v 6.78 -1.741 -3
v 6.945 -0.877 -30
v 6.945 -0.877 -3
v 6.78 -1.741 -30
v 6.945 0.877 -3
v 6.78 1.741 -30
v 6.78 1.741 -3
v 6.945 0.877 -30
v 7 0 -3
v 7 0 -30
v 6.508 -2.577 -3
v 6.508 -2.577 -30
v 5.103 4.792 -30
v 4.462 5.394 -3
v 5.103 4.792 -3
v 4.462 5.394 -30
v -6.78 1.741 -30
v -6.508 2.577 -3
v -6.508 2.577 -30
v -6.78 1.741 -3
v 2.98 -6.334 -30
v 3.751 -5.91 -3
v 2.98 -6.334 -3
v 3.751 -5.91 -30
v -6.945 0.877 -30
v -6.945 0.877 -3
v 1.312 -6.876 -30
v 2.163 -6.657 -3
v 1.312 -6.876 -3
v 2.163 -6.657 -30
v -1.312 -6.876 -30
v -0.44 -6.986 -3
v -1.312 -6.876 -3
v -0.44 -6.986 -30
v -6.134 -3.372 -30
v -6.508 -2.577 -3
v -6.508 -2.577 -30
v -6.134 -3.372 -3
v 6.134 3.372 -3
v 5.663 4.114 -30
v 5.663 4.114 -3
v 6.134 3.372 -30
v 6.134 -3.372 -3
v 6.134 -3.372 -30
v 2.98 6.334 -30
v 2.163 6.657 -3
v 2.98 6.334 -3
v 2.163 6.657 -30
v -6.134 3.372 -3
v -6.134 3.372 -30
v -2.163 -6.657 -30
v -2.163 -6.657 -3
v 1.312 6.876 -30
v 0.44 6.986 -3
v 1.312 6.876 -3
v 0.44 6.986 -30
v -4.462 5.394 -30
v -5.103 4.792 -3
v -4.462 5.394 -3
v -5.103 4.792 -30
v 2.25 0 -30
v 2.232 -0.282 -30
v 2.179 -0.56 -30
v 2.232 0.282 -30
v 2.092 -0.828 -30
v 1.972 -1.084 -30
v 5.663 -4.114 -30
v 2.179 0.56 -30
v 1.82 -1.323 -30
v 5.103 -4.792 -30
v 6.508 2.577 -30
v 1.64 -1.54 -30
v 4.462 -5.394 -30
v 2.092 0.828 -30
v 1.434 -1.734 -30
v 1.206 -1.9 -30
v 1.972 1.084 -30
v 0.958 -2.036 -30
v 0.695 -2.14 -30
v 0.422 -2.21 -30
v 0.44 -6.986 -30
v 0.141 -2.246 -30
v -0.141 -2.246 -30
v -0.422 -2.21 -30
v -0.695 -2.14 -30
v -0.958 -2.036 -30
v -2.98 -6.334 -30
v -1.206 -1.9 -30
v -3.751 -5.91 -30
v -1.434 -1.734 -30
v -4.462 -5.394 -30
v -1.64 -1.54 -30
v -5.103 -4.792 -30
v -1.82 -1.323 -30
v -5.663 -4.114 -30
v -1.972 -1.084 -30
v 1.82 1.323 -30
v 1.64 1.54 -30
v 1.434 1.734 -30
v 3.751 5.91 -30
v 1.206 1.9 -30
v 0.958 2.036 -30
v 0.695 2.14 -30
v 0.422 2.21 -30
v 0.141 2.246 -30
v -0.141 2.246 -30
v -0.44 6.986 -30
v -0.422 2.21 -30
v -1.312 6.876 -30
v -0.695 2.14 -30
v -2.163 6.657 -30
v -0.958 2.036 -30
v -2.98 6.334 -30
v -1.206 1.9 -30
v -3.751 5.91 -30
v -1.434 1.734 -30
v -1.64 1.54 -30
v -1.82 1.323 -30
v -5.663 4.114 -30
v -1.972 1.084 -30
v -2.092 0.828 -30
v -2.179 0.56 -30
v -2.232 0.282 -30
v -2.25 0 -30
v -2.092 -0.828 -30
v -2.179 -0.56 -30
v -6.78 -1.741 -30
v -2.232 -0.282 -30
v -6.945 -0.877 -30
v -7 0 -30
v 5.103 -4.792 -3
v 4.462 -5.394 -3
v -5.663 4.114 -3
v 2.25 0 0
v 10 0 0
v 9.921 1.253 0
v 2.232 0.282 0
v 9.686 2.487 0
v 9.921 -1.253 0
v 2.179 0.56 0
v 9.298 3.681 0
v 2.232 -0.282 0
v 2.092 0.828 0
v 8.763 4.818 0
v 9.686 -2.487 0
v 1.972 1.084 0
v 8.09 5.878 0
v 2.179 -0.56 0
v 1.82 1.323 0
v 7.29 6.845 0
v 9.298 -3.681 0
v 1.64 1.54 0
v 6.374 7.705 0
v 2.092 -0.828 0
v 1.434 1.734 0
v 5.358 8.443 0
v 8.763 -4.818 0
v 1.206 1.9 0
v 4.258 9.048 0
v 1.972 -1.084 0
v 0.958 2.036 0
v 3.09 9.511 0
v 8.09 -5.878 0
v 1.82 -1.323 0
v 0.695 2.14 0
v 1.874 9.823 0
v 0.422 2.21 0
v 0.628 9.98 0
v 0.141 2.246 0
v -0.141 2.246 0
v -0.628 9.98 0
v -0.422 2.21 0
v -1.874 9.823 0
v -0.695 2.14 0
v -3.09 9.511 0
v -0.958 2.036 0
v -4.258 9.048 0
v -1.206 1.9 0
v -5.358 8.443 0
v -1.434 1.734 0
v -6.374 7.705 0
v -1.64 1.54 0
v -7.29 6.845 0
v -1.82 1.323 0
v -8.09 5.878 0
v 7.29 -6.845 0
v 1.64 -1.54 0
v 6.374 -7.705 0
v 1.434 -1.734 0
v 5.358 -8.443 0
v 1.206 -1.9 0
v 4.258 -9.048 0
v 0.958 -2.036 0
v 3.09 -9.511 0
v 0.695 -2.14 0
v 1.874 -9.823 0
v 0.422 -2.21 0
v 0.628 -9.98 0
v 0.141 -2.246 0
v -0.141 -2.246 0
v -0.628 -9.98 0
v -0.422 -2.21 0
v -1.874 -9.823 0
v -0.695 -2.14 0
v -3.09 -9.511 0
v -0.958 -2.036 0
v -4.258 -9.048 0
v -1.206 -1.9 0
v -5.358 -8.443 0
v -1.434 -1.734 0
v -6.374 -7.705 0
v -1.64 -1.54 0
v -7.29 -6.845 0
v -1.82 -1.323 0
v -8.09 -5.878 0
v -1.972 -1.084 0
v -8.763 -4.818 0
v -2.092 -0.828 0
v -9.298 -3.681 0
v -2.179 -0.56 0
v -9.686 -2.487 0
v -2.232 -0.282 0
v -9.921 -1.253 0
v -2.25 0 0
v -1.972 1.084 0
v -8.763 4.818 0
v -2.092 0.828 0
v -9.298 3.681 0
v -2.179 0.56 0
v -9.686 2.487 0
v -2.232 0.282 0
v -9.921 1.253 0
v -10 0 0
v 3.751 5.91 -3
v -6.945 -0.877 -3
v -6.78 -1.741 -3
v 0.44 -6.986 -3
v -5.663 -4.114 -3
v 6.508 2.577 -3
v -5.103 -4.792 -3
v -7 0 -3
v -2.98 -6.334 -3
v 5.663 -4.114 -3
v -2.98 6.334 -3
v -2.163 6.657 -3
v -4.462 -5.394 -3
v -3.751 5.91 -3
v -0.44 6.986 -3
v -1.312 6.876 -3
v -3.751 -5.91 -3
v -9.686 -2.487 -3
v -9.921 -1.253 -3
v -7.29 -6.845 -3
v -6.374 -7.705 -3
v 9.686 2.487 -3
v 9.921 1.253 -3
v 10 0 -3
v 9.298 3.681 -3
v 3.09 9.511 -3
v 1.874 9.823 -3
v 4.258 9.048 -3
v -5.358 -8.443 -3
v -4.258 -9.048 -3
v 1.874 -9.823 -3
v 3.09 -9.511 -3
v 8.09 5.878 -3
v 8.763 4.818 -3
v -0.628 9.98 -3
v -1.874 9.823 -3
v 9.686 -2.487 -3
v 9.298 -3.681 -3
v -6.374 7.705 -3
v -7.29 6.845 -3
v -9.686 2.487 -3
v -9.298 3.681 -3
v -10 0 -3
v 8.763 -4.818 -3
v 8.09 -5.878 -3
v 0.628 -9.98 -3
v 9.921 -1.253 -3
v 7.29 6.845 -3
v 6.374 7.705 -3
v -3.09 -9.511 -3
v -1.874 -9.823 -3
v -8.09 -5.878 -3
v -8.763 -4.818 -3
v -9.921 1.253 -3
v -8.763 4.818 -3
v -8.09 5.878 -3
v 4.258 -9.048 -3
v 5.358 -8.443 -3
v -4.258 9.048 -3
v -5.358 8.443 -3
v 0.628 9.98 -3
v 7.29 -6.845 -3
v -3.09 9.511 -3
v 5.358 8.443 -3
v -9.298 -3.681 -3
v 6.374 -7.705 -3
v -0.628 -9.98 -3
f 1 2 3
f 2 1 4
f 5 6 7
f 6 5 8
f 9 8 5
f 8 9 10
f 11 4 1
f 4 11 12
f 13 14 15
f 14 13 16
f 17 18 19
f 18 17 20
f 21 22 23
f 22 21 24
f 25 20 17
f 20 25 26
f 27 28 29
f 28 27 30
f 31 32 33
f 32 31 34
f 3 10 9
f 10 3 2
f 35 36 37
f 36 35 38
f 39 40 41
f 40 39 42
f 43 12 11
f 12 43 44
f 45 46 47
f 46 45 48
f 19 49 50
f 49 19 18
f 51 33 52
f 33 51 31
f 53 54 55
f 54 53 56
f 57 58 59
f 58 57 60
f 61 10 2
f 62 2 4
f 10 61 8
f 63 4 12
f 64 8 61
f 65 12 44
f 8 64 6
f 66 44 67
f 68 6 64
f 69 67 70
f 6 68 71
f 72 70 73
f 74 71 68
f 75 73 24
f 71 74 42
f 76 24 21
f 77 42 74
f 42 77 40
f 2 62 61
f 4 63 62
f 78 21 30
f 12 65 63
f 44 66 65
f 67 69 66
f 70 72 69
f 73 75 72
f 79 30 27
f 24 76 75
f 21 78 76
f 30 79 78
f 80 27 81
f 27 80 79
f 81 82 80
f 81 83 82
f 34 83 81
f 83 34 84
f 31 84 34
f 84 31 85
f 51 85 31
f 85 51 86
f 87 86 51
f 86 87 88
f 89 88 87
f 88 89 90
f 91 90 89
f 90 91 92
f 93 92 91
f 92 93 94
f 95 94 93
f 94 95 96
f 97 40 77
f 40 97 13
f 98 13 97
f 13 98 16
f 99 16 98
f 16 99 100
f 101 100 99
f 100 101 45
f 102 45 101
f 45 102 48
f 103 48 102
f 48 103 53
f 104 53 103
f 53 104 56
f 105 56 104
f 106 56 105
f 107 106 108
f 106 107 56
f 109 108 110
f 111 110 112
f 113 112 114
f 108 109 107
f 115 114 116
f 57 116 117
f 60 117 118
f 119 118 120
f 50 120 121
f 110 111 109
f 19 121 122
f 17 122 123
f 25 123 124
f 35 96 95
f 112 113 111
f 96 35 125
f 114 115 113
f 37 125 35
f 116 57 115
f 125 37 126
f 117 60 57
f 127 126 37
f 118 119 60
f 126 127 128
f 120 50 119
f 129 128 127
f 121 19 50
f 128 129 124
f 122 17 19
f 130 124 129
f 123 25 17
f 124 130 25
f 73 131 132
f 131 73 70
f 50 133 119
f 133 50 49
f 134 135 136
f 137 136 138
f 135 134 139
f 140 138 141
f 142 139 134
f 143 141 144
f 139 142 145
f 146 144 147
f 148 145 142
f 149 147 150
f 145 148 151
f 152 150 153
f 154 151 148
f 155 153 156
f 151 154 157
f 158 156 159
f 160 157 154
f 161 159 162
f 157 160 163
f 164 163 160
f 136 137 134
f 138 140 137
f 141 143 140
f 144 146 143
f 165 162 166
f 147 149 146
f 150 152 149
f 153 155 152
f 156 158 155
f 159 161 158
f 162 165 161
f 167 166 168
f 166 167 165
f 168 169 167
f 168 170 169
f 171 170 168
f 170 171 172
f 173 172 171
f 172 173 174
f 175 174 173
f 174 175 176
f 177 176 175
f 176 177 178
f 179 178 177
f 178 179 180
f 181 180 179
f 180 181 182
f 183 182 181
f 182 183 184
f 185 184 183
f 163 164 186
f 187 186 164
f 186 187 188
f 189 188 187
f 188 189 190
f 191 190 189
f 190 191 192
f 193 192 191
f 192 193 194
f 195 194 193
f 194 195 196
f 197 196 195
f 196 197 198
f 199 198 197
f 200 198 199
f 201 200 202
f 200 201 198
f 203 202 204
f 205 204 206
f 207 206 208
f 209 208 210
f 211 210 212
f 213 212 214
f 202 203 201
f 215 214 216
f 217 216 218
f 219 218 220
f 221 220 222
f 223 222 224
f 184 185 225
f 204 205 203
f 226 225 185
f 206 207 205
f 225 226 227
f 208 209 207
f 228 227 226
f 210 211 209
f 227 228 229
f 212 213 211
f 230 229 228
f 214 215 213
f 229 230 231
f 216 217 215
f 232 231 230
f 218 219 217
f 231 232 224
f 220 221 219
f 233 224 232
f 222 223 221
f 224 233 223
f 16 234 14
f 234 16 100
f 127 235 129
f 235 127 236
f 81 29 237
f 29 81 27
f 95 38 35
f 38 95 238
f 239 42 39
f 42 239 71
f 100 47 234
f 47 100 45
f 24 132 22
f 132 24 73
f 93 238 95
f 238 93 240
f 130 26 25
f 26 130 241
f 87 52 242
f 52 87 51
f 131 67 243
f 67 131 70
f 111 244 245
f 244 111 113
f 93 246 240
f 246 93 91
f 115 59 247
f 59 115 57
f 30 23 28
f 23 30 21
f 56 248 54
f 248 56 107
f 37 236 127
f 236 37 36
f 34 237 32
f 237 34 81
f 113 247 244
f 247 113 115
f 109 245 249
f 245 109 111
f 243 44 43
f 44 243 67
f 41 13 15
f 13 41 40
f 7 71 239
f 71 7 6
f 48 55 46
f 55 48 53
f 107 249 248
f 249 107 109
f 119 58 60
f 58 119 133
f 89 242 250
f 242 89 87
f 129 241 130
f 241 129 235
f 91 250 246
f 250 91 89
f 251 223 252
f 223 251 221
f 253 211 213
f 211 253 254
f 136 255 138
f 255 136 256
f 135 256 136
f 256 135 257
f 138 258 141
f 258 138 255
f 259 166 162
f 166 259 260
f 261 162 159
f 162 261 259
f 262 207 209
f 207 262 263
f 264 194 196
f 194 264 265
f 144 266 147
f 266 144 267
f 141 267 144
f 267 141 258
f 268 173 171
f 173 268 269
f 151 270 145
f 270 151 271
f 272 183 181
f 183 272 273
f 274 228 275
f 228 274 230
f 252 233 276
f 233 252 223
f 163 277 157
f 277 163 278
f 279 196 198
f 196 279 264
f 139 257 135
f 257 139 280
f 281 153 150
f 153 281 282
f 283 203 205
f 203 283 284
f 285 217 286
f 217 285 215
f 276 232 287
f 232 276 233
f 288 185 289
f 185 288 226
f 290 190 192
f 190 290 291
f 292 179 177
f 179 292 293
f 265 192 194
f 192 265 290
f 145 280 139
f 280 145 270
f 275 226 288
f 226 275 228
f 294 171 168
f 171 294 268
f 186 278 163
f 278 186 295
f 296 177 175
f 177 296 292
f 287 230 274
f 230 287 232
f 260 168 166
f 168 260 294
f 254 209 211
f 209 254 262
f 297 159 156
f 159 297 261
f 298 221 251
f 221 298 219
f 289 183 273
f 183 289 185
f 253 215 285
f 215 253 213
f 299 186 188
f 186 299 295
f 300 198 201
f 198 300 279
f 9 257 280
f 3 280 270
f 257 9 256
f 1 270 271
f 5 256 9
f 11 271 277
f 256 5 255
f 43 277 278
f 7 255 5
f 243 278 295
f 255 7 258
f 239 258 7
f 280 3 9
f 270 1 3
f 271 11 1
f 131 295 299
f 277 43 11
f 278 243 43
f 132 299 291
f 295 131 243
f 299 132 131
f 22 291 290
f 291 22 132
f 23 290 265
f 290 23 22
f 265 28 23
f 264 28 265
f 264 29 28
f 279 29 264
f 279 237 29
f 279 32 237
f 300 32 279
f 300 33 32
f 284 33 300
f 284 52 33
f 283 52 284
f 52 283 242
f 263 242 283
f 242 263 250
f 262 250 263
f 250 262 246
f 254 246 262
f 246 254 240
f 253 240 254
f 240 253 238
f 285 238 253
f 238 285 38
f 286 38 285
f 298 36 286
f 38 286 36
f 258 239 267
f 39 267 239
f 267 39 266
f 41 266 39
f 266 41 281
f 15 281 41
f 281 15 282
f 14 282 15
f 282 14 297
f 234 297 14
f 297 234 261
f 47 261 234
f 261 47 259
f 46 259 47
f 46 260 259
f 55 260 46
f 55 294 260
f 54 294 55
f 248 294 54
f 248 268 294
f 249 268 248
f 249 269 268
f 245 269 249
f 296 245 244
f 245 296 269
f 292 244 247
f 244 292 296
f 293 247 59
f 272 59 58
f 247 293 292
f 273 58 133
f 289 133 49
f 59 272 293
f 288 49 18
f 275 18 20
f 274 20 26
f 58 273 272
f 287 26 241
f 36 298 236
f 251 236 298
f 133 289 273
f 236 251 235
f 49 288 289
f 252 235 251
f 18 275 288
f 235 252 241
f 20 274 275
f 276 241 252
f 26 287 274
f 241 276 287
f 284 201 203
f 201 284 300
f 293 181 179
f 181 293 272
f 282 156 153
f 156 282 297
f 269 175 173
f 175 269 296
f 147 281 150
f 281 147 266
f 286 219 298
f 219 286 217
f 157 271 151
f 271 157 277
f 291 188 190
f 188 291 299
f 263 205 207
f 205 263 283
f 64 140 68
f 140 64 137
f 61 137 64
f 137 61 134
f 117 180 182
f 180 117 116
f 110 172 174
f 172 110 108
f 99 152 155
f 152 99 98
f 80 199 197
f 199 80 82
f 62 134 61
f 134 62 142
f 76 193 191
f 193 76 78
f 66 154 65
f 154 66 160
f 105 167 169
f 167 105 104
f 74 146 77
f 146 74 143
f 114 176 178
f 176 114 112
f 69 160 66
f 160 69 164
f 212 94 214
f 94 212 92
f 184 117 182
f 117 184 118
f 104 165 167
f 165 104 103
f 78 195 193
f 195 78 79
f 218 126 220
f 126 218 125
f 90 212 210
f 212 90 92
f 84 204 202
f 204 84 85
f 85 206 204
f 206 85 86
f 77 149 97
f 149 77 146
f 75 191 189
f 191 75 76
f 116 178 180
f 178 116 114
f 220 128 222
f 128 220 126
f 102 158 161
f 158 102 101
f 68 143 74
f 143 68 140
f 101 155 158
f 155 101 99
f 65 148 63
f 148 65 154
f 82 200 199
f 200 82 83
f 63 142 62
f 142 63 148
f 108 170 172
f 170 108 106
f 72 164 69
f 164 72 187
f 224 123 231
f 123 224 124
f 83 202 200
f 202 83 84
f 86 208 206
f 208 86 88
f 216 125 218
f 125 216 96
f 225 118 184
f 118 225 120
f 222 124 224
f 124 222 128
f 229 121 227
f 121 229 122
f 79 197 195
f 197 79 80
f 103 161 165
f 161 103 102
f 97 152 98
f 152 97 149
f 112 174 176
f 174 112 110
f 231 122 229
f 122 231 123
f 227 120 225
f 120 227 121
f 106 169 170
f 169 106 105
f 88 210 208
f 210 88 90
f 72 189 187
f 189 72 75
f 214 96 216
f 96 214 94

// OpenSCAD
$fn = 50;


difference() {
	union() {
		translate(v = [0, 0, -30.0000000000]) {
			cylinder(h = 30, r = 7.0000000000);
		}
		translate(v = [0, 0, -3.0000000000]) {
			cylinder(h = 3, r = 10.0000000000);
		}
	}
	union() {
		#translate(v = [0, 0, -30]) {
			cylinder(h = 30, r = 2.2500000000);
		}
	}
}
